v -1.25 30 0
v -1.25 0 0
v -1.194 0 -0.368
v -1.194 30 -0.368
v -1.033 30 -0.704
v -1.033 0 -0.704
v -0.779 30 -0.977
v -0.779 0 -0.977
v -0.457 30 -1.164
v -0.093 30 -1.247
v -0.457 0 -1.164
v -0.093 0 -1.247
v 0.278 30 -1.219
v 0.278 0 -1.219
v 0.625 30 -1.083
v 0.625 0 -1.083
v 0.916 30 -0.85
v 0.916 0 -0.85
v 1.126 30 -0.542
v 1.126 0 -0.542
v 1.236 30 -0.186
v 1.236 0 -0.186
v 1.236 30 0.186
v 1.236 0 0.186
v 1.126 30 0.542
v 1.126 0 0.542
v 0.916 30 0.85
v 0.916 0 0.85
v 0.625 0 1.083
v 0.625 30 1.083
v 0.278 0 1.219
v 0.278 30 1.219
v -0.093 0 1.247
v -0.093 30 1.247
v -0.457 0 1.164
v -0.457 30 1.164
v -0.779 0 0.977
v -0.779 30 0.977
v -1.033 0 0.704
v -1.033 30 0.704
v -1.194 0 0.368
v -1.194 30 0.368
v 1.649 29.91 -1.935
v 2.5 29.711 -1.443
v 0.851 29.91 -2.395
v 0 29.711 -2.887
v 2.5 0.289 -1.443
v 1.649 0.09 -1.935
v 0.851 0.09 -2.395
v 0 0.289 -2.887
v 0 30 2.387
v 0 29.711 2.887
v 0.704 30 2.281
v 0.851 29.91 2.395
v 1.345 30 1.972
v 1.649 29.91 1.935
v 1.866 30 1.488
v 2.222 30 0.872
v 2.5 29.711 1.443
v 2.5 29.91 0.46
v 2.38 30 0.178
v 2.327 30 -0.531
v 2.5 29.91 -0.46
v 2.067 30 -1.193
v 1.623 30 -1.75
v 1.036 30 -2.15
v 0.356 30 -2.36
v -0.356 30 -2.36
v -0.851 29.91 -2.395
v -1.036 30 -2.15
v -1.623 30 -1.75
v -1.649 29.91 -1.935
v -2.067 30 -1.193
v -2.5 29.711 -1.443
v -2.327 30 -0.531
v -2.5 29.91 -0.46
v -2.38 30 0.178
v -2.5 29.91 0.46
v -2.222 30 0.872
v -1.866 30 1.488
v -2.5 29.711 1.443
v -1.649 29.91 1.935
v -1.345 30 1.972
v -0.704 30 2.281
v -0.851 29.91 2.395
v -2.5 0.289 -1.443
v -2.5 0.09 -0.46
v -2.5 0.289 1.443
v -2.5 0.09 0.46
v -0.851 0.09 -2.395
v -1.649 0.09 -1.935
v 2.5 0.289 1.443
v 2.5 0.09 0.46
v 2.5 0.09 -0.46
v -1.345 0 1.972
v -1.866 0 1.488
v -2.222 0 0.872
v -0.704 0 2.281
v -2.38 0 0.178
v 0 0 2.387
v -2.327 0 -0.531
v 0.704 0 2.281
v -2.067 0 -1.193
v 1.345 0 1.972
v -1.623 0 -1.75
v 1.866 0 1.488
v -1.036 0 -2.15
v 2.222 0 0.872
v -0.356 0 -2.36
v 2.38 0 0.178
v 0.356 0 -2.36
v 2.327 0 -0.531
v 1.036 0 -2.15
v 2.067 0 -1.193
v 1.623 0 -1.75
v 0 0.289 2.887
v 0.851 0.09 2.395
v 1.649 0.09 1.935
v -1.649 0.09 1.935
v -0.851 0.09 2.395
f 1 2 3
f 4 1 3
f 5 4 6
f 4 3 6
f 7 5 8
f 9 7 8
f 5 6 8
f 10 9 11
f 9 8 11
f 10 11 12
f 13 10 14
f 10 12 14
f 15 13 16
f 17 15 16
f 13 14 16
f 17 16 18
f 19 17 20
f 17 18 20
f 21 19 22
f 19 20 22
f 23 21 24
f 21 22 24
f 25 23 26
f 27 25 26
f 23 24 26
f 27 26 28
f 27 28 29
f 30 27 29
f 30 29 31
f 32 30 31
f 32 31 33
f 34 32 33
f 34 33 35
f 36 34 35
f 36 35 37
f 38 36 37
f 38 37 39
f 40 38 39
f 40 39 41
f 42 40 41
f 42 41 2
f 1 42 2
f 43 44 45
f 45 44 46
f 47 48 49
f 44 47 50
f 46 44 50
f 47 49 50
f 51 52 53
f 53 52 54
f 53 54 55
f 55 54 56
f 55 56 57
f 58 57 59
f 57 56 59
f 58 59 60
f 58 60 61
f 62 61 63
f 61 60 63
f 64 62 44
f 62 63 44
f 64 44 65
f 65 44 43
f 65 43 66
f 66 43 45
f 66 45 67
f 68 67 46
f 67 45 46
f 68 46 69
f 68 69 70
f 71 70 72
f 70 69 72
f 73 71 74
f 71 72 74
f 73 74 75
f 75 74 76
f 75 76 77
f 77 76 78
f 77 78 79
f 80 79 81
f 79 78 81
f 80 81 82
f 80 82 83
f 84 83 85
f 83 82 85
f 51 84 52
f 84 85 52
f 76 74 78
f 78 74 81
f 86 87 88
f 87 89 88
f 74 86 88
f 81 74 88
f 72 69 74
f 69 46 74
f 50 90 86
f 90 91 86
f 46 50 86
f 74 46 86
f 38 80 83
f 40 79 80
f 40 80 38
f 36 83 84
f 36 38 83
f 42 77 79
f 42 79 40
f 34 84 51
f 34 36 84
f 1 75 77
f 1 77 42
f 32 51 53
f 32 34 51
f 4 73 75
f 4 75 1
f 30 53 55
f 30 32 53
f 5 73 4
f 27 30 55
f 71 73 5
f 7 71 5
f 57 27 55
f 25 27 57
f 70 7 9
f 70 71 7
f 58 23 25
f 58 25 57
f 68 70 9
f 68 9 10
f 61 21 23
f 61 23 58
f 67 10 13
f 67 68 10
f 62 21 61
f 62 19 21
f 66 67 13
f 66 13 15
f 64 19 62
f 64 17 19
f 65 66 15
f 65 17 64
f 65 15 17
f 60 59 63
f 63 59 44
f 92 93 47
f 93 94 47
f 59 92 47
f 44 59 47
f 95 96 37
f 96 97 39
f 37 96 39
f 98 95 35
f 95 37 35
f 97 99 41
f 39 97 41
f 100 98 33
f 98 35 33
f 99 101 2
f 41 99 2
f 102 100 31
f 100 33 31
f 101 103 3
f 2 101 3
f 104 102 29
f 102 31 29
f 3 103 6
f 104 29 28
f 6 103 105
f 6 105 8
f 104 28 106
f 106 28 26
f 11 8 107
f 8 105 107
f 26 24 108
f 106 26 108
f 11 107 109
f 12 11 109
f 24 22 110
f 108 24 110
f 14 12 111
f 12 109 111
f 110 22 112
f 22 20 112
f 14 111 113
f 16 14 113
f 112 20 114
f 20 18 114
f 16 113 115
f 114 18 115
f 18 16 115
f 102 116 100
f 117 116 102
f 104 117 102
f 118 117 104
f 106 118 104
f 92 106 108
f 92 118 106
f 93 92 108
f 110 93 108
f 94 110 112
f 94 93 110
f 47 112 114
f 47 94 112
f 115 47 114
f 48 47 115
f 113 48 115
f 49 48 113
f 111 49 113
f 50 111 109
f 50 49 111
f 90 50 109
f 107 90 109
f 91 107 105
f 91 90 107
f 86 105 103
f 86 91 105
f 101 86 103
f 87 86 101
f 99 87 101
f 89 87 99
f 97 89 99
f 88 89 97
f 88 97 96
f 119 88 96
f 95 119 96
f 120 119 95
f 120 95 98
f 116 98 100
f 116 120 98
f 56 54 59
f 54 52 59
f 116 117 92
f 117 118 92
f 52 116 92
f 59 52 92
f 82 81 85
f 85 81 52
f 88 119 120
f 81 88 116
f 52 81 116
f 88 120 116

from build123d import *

# Parameters (mm, degrees)
EXTRUDE_1_DEPTH   = 30
HOLE_WIZARD_M31_D = 2.5


with BuildPart() as part:
    # Эскиз1 → Бобышка-Вытянуть1 (new body)
    with BuildSketch(Plane(origin=(0, 0, 0), x_dir=(1, 0, 0), z_dir=(0, 1, 0))):
        Polygon((0, 2.886751346), (-2.5, 1.443375673), (-2.5, -1.443375673), (0, -2.886751346), (2.5, -1.443375673), (2.5, 1.443375673), align=None)
    extrude(amount=EXTRUDE_1_DEPTH)

    # Отверстие обработанное метчиком M31 (through all)
    with Locations(Plane(origin=(0, 30, 0), x_dir=(1, 0, 0), z_dir=(0, 1, 0))):
        with Locations((0, 0)):
            Hole(HOLE_WIZARD_M31_D / 2)

    # Эскиз4 → Вырез-Повернуть1 (revolve, cut)
    with BuildSketch(Plane(origin=(0, 0, 0), x_dir=(0, 0, -1), z_dir=(1, 0, 0)), mode=Mode.PRIVATE) as cut_revolve_1_sk:
        Polygon((1.86348431, 30.302108364), (3.639820408, 29.27654024), (3.639820408, 31.381488227), (1.86348431, 31.381488227), align=None)
        Polygon((1.86348431, -0.302108364), (3.639820408, 0.72345976), (3.639820408, -1.381488227), (1.86348431, -1.381488227), align=None)
    revolve(cut_revolve_1_sk.sketch.rotate(Axis((0, 0, 0), (0, 1, 0)), 180), axis=Axis((0, 0, 0), (0, 1, 0)), mode=Mode.SUBTRACT)


solid = part.part
